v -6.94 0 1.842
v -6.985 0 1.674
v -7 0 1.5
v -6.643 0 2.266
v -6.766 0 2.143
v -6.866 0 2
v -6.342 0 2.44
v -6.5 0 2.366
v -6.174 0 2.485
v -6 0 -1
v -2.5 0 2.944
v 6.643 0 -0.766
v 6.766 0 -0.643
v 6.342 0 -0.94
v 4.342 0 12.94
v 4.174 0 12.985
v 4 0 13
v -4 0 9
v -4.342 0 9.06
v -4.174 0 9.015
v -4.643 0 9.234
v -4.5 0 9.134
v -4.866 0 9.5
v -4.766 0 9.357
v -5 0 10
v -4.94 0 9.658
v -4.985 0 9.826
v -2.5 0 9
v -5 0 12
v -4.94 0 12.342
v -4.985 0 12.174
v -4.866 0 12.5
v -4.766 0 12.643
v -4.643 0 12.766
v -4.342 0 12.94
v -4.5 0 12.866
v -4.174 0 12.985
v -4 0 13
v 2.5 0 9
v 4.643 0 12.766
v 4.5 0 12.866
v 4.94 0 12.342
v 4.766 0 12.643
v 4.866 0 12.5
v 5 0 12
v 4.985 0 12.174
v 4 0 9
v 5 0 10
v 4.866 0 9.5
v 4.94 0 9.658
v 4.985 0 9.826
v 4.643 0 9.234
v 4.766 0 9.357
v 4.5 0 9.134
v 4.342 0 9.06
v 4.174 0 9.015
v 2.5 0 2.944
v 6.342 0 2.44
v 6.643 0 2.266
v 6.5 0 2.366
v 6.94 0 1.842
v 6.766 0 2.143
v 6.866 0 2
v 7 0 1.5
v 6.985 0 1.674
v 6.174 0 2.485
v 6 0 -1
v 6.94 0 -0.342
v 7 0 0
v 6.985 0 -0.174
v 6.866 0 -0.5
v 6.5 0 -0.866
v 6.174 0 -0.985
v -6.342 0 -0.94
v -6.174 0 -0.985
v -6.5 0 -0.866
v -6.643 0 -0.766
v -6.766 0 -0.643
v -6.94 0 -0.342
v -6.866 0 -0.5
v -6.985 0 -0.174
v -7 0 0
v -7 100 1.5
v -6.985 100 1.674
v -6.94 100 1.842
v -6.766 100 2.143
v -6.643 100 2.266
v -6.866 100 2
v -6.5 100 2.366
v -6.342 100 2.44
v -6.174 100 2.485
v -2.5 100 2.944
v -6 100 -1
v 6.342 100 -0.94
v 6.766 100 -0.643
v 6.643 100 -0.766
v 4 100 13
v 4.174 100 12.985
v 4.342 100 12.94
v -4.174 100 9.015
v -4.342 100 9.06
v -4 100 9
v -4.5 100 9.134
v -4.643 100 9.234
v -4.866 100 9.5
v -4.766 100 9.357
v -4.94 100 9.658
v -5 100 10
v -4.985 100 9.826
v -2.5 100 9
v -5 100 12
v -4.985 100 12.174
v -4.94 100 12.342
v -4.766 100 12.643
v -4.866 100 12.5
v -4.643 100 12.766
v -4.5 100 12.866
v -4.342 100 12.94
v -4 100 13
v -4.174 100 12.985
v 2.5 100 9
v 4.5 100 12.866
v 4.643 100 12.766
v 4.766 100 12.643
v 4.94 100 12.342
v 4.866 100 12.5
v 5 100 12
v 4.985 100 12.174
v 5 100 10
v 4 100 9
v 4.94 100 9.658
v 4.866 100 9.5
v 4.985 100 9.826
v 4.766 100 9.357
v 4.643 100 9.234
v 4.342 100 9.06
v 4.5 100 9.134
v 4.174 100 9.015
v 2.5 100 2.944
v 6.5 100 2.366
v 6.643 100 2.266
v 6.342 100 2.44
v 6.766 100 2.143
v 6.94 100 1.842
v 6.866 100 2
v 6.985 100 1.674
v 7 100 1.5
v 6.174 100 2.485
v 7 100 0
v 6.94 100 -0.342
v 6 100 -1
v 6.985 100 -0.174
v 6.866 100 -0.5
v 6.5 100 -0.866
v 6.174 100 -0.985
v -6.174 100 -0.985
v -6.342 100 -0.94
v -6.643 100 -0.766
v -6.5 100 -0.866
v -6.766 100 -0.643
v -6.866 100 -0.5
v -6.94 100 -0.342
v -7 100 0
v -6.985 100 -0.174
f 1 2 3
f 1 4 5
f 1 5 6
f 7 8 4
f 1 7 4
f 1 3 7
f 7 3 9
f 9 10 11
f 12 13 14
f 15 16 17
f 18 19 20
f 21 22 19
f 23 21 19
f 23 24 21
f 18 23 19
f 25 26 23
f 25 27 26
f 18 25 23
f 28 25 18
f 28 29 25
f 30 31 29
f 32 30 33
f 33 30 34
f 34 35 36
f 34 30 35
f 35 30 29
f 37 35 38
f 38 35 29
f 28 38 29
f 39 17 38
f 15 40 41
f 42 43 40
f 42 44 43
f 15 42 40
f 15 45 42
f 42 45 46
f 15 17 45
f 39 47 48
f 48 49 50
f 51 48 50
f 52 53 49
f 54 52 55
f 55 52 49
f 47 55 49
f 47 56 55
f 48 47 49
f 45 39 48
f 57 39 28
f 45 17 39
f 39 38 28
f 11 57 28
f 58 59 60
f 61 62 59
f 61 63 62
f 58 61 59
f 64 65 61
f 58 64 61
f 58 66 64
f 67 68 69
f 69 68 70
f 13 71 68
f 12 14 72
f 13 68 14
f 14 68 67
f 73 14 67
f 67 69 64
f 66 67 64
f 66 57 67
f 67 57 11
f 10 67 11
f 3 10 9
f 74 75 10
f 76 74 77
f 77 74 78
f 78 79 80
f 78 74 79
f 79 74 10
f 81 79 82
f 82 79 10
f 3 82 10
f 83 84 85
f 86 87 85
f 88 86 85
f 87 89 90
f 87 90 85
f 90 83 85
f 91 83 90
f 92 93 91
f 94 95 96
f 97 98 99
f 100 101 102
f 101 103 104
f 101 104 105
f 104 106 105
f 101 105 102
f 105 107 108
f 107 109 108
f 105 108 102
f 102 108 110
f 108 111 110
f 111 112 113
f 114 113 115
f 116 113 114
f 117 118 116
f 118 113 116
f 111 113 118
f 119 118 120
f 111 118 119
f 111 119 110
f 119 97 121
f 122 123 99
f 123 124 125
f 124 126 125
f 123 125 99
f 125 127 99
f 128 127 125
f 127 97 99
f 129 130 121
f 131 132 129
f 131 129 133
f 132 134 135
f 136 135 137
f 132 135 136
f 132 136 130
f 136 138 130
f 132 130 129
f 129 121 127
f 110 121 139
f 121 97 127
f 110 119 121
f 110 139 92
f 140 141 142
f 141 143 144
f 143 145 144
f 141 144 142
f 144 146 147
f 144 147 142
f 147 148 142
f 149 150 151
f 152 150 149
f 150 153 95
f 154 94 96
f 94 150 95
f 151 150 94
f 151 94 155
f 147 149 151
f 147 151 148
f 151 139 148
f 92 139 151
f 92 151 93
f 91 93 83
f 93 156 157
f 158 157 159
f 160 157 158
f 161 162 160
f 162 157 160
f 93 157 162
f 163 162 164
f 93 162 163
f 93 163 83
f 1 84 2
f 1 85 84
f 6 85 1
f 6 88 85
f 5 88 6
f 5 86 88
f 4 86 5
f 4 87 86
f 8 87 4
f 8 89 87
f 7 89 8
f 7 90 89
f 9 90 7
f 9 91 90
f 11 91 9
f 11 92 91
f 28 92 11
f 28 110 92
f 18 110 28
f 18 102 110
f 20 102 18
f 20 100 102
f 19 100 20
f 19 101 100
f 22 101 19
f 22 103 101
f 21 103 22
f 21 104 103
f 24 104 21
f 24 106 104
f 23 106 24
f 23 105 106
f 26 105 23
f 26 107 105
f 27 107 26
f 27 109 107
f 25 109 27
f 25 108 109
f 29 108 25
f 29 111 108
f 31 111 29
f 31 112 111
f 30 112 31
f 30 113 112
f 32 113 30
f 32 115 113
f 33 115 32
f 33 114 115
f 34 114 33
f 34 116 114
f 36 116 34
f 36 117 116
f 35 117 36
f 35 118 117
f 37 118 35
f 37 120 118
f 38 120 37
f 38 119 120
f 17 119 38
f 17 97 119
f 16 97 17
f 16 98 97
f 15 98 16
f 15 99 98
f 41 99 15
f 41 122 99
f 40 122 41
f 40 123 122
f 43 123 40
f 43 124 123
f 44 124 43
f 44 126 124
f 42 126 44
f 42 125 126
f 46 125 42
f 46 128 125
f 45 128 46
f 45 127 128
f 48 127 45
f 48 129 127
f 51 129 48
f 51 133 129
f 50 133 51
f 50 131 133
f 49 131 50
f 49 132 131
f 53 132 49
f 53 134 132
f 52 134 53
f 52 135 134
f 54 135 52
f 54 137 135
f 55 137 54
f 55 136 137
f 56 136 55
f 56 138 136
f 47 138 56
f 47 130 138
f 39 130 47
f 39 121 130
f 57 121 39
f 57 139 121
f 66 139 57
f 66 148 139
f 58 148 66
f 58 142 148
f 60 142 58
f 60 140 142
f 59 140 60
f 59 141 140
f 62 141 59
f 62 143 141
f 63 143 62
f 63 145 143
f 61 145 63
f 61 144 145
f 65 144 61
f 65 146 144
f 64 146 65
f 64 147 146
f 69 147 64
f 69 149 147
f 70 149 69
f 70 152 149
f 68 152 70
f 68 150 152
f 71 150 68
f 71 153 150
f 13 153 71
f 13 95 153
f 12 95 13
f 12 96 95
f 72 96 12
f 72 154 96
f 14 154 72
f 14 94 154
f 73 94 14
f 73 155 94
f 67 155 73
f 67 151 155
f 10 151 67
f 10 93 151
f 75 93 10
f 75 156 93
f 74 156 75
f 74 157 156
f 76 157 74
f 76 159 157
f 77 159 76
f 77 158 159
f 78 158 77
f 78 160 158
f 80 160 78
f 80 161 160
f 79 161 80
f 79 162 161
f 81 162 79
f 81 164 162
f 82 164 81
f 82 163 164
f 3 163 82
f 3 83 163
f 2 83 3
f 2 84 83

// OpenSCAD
//polygon ([[0,0],[0, -5],[1.5,-5],[2,-2],[8,-2],[8,-4],[10,-4],[10,4],[8,4],[8,2],[2,2],[1.5,5],[0,5]]);

$fn=36;
module rail_shape1 (){
translate([0, -6])
    circle(radius = 1);
translate([1.5, -6])
    circle(radius = 1);
translate([2,-2])
    circle(radius = 1);
translate([2,2])
    circle(radius = 1);
translate([1.5,6])
    circle(radius = 1);
translate([0,6])
    circle(radius = 1);
}

module rail_shape2 (){
translate([10,-2])
    circle(radius = 1);
translate([10,-4])
    circle(radius = 1);
translate([12,-4])
    circle(radius = 1);
translate([12,4])
    circle(radius = 1);
translate([10,4])
    circle(radius = 1);
translate([10,2])
    circle(radius = 1);
}



//[1.5,-5],[2,-2],[8,-2],[8,-4],[10,-4],[10,4],[8,4],[8,2],[2,2],[1.5,5],[0,5]

module rail() {
    hull ()
    rail_shape1();
    hull ()
    rail_shape2();
    polygon([[0,-2.5],[12,-2.5],[12,2.5],[0,2.5]]);
}


rotate ([0,0,-90])
rotate ([0,-90,0])
linear_extrude ()
    rail();
